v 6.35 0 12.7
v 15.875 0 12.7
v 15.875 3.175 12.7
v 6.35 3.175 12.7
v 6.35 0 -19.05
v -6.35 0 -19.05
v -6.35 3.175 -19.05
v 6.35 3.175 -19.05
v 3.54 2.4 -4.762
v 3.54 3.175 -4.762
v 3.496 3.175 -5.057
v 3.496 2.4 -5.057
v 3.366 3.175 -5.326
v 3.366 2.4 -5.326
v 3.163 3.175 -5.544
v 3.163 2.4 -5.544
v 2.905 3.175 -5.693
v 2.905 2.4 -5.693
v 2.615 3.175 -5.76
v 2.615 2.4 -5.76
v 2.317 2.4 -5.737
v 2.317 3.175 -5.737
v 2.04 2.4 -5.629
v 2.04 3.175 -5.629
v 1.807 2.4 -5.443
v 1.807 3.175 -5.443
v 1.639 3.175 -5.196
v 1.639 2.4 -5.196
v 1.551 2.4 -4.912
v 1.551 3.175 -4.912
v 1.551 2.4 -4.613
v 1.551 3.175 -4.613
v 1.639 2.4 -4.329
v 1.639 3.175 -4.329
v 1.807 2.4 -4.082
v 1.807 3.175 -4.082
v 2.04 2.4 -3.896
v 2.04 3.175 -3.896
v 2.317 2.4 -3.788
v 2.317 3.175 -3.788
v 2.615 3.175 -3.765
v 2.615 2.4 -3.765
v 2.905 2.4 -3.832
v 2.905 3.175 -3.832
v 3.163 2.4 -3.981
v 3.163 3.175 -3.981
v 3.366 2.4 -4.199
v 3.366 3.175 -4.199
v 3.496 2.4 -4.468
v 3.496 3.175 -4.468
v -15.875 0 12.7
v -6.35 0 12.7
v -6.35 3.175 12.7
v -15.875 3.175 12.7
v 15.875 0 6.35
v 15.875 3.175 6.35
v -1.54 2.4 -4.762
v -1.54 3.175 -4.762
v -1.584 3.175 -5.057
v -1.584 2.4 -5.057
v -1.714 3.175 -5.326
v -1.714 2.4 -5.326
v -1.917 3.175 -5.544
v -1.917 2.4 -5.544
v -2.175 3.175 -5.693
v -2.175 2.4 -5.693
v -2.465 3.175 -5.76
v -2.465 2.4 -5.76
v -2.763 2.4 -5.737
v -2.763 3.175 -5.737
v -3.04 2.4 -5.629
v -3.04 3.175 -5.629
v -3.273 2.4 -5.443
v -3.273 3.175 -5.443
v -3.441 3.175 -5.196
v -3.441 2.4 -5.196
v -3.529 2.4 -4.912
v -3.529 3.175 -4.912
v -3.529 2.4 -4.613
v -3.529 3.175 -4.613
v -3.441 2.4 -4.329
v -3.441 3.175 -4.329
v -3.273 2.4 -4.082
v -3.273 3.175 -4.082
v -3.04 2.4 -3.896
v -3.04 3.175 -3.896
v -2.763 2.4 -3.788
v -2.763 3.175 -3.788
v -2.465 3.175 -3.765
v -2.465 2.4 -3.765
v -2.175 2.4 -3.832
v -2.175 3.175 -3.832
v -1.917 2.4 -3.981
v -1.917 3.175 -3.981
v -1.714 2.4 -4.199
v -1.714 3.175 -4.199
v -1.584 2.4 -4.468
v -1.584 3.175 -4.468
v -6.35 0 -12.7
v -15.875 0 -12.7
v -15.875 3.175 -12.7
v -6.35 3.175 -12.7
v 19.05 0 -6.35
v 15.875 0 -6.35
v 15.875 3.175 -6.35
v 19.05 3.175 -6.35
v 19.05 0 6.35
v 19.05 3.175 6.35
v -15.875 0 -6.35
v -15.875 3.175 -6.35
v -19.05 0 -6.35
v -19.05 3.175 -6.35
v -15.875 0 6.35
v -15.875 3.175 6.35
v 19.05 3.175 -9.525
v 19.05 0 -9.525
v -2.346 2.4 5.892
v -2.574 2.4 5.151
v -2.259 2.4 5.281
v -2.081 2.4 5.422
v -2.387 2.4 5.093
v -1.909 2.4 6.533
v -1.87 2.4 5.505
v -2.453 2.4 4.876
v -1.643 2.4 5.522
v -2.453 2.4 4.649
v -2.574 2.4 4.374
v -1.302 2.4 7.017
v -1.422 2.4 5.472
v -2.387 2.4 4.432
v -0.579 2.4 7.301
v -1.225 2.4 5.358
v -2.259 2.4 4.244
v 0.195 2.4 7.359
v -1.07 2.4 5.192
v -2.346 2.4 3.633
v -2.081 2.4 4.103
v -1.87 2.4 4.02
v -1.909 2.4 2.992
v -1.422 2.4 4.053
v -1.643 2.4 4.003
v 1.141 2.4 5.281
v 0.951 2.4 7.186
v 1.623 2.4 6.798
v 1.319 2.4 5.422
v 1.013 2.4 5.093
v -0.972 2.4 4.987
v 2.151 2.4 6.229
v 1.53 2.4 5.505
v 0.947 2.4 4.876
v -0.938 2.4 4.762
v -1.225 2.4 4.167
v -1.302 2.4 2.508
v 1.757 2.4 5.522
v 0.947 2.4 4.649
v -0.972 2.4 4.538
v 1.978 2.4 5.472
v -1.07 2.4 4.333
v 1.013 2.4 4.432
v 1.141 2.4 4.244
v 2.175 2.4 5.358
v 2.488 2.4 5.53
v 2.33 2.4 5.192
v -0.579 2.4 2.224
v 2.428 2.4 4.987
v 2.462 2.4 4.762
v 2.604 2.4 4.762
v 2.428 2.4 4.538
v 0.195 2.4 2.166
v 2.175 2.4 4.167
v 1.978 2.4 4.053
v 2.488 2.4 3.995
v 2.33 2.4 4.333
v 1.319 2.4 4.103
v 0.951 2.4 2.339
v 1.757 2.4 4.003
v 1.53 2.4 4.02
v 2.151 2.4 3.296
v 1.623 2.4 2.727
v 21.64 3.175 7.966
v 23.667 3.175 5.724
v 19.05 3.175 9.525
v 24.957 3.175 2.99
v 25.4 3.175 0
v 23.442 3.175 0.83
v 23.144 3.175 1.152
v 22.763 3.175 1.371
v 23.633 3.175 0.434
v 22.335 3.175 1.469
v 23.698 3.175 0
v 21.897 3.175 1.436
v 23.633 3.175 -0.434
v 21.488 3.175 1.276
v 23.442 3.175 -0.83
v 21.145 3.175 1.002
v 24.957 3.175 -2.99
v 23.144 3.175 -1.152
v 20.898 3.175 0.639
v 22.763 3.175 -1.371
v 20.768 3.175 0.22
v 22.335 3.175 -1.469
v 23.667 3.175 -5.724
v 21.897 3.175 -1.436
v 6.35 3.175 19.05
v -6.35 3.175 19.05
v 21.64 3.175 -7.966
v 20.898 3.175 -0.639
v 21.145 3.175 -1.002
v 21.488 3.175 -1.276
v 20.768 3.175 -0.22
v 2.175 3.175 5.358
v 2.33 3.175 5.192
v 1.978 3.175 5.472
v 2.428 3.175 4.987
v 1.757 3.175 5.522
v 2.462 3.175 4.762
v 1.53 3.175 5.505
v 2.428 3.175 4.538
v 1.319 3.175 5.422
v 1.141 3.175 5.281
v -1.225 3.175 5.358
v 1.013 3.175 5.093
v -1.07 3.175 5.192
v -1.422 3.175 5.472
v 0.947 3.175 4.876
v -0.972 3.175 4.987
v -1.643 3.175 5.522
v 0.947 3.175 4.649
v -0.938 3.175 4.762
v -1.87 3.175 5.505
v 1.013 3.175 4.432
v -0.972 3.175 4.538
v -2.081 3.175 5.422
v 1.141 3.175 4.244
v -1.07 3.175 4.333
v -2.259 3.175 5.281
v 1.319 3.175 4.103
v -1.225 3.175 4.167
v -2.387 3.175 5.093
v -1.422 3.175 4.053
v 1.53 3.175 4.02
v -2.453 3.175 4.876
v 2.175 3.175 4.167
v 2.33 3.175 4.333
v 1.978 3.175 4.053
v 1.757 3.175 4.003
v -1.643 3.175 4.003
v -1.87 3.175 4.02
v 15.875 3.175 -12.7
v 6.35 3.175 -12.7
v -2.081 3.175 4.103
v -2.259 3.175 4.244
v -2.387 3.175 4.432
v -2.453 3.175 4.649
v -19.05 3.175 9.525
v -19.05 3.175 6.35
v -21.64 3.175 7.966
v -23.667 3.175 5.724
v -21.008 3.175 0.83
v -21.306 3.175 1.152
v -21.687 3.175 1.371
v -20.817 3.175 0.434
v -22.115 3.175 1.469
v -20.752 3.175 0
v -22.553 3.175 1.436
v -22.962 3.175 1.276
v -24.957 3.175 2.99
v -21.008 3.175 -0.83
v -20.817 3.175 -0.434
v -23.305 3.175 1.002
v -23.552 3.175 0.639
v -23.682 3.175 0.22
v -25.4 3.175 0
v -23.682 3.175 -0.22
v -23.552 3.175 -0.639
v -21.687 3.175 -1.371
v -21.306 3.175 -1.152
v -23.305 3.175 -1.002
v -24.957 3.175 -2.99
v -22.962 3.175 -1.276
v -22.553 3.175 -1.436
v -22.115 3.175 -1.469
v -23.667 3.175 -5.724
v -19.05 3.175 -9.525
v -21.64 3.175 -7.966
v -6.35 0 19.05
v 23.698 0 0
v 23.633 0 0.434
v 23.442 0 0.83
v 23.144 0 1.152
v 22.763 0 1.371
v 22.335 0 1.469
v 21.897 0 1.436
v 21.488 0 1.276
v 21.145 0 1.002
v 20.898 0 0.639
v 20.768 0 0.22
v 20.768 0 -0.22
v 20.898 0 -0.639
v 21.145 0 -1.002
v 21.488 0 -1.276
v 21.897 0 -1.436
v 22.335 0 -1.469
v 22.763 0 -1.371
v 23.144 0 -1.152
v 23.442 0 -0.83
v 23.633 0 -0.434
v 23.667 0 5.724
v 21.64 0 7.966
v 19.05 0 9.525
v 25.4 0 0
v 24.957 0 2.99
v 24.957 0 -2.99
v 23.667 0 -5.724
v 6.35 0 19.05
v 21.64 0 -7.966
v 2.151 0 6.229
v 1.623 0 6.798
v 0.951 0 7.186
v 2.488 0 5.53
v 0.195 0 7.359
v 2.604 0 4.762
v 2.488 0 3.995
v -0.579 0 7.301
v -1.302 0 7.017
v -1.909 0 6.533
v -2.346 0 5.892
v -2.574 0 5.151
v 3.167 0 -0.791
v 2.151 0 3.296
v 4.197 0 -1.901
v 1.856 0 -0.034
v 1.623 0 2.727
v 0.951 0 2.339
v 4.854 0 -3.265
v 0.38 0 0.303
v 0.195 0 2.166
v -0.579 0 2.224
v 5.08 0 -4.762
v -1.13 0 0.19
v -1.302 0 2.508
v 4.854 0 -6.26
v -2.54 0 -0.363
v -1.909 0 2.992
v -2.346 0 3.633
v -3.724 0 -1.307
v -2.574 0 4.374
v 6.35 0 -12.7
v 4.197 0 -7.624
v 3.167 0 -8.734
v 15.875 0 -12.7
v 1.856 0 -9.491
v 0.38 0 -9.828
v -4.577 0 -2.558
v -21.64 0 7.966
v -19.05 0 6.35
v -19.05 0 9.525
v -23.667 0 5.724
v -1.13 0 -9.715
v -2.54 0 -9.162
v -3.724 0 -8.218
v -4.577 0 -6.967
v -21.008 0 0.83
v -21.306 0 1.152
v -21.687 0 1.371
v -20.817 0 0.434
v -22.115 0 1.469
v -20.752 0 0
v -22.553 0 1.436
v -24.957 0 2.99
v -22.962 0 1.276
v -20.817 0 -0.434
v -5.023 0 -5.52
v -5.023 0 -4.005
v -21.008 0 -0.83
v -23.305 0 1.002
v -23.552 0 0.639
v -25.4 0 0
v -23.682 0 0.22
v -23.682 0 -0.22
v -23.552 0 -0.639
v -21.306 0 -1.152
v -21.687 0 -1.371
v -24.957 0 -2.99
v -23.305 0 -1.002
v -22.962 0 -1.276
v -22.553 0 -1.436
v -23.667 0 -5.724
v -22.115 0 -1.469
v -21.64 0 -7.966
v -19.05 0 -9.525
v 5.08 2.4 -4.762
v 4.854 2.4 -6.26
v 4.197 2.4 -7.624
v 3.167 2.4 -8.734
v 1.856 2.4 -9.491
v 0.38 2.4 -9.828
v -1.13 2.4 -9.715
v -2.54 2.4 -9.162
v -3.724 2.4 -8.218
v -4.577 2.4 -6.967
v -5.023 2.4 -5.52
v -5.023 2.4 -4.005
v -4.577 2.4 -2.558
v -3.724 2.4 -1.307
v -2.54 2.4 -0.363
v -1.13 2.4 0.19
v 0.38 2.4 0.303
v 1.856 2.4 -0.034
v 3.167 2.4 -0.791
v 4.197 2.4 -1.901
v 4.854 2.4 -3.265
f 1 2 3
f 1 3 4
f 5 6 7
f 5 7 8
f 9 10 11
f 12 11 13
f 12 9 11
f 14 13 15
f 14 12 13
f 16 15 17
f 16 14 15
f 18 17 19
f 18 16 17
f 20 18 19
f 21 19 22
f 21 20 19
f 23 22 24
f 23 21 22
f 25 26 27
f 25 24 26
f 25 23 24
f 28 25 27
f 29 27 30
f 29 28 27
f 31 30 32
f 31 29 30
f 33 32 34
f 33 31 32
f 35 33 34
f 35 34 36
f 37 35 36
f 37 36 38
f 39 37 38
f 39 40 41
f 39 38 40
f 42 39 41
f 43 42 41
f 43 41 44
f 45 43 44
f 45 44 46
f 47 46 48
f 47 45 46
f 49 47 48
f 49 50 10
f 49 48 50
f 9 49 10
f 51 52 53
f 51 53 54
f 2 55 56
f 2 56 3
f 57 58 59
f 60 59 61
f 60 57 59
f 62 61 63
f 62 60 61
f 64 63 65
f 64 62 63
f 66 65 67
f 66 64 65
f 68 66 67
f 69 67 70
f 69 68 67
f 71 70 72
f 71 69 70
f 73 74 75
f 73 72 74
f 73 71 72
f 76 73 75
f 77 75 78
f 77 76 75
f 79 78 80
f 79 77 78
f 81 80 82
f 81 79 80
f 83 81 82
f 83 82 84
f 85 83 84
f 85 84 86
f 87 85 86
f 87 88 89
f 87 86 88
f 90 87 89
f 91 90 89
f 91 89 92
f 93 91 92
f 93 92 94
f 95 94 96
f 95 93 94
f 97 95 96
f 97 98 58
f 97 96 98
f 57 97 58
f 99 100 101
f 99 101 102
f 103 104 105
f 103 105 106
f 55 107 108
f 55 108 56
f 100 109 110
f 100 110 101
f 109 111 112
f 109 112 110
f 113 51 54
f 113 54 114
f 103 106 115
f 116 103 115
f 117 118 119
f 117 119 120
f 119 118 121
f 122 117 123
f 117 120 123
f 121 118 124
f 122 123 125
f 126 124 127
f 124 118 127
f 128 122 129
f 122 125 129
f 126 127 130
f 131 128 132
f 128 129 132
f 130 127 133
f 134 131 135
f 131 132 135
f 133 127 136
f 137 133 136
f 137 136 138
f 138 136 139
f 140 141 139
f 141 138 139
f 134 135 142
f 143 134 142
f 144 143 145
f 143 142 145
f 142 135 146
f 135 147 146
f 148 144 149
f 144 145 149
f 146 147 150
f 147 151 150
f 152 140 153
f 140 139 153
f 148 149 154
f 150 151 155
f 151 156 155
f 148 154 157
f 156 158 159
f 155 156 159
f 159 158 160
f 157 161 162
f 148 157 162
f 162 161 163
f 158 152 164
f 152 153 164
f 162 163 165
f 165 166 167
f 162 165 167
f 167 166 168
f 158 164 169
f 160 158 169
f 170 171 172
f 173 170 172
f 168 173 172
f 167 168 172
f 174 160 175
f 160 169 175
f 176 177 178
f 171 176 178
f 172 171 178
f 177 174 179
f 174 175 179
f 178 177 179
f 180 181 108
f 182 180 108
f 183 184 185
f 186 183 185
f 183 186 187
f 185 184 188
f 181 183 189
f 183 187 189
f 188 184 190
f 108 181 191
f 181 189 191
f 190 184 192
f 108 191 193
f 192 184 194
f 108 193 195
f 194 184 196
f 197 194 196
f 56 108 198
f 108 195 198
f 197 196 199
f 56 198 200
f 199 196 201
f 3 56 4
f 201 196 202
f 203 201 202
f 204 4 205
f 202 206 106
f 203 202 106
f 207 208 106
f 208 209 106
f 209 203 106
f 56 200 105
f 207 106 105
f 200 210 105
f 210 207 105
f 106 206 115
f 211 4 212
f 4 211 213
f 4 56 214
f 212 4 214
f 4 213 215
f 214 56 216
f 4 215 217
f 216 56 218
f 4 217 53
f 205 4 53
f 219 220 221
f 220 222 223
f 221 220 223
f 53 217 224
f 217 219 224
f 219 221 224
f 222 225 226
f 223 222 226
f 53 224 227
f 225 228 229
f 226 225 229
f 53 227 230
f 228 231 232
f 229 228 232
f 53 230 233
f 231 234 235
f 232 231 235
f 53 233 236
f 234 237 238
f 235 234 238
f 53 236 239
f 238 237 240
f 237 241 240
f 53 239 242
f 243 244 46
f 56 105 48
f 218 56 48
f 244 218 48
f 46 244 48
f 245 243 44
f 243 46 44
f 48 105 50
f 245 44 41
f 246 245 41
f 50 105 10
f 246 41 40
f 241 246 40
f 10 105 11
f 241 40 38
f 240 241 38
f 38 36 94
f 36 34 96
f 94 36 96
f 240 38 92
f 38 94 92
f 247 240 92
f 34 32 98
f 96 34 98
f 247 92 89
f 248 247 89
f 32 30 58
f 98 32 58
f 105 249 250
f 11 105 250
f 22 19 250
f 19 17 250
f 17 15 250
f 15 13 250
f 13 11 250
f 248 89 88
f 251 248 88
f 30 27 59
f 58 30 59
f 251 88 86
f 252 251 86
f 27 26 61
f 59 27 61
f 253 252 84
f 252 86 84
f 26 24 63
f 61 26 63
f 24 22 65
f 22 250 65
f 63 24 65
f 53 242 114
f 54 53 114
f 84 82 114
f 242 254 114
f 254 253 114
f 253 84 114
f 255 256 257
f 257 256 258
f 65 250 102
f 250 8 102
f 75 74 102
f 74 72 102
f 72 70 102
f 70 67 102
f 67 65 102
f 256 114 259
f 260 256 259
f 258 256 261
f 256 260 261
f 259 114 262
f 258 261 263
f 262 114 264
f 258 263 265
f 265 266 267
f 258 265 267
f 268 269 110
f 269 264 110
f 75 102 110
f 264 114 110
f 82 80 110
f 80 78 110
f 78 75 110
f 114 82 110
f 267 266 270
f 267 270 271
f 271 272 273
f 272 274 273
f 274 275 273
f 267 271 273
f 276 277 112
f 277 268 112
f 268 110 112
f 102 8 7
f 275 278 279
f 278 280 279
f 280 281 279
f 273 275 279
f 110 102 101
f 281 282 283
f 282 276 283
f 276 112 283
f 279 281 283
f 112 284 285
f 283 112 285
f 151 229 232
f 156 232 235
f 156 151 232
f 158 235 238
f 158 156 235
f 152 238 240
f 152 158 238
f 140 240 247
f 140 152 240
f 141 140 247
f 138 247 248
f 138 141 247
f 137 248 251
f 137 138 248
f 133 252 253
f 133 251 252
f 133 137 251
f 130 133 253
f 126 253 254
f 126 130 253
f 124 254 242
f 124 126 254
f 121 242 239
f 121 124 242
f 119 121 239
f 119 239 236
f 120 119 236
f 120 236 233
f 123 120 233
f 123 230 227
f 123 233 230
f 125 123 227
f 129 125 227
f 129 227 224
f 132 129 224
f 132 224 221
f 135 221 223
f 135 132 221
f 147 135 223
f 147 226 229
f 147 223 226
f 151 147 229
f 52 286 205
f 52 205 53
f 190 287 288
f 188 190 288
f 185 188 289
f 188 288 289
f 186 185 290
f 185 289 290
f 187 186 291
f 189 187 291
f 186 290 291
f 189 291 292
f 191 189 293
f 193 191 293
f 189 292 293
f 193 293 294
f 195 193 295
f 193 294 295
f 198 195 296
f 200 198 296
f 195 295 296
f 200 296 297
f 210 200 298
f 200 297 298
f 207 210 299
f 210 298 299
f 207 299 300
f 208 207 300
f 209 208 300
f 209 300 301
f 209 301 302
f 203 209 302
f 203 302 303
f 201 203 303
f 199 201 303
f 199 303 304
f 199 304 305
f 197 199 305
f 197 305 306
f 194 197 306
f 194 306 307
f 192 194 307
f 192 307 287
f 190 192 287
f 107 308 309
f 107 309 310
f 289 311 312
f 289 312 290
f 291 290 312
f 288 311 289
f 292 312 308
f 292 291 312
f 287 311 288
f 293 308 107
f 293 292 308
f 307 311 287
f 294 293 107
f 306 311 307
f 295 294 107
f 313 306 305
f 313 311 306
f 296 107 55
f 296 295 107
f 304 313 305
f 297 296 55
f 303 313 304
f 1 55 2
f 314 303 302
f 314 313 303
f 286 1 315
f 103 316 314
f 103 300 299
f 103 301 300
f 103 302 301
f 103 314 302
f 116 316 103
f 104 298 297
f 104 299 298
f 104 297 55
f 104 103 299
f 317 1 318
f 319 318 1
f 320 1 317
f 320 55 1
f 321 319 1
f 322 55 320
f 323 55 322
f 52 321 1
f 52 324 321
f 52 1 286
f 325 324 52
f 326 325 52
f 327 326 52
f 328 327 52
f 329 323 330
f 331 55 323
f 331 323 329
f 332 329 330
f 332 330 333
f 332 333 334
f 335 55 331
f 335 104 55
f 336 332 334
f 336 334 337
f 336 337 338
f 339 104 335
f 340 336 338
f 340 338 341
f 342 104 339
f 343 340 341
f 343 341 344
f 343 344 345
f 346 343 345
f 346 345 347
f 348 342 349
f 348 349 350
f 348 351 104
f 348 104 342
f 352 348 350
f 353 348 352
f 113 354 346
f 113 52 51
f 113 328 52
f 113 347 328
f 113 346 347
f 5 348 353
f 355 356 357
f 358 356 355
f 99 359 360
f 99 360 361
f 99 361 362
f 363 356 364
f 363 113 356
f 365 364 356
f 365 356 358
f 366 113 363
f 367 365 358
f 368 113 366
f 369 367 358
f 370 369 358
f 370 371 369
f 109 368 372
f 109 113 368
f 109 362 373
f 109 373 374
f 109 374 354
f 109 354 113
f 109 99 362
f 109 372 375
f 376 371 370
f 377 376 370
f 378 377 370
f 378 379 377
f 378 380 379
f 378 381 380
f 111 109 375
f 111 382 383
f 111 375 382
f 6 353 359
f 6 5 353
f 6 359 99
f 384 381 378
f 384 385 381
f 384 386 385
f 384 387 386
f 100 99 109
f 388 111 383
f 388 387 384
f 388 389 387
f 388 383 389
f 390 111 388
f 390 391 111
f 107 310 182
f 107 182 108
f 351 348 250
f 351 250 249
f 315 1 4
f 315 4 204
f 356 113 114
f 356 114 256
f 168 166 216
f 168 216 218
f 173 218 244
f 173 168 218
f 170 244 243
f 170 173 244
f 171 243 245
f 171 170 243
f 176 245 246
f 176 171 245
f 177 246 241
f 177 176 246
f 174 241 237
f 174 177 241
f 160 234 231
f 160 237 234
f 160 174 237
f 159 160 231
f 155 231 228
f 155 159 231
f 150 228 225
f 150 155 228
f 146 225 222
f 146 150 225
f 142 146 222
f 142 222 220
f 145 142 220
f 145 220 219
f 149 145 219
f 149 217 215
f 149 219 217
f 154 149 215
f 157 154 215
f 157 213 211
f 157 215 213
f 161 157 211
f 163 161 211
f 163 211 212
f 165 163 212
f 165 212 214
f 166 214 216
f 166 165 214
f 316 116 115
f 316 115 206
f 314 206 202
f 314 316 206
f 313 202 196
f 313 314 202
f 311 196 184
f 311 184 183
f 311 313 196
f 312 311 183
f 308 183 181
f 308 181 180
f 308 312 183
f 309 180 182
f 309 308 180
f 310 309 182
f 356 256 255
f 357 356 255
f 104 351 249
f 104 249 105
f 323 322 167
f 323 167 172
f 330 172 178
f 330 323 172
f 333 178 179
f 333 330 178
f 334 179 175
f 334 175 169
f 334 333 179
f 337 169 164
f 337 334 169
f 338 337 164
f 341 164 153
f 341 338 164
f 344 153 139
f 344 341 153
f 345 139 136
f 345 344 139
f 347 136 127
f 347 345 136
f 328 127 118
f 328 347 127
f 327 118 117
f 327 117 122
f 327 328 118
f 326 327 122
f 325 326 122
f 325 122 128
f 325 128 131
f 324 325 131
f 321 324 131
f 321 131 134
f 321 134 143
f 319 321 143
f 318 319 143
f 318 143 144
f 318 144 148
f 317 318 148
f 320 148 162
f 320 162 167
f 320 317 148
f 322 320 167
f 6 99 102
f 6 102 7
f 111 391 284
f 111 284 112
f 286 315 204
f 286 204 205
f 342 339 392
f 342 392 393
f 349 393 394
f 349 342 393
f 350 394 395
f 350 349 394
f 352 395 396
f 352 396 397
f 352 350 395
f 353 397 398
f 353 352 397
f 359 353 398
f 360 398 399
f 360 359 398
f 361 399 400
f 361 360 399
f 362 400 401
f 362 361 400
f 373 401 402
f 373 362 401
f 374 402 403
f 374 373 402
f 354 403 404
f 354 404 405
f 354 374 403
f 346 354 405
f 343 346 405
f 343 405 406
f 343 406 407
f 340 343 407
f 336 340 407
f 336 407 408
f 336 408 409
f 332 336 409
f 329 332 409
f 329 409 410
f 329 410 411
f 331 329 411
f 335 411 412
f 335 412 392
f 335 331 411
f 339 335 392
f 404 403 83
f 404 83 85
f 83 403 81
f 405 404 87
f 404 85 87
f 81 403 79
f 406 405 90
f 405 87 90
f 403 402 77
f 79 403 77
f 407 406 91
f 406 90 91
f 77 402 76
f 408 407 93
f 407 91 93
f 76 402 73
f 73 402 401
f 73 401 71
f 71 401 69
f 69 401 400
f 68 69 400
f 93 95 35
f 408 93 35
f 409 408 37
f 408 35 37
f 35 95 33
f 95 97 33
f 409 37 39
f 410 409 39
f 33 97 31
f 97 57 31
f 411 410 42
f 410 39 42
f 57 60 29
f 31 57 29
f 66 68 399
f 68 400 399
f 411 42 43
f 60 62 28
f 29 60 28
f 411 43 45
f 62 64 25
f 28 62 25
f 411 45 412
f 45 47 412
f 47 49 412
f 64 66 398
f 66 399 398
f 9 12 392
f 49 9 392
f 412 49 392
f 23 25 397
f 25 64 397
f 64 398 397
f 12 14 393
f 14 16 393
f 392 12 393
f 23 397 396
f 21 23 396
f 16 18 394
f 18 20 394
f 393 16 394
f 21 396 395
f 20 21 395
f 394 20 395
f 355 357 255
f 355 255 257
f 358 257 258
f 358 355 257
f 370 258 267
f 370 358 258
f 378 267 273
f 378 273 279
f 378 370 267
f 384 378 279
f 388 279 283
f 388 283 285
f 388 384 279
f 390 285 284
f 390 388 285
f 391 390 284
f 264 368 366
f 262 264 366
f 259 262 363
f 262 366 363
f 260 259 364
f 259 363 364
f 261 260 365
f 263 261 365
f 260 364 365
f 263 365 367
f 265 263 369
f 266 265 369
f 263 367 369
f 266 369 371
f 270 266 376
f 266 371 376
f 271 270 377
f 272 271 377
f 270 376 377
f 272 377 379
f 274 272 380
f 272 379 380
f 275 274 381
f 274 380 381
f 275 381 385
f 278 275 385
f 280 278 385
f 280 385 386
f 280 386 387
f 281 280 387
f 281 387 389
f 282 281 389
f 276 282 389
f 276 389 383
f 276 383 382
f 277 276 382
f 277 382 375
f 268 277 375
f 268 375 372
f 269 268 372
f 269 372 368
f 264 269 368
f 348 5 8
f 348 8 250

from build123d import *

# Parameters (mm, degrees)
BOSS_EXTRUDE1_DEPTH       = 3.175
F_4_CLEARANCE_HOLE1_D     = 2.9464
F_4_CLEARANCE_HOLE1_DEPTH = 6.35
F_4_CLEARANCE_HOLE1_TIP   = 0.885187864
CUT_EXTRUDE3_REACH        = 33.908
SKETCH4_R                 = 0.762
SKETCH4_R_2               = 1
SKETCH4_3_R               = 5.08
SKETCH4_3_R_2             = 1
SKETCH4_3_R_3             = 2.6035
SKETCH4_3_R_4             = 0.762
CUT_EXTRUDE4_DEPTH        = 2.4


with BuildPart() as part:
    # Sketch1 → Boss-Extrude1 (new body)
    with BuildSketch(Plane(origin=(0, 0, 0), x_dir=(1, 0, 0), z_dir=(0, 1, 0))):
        with BuildLine():
            Line((-15.875, 12.7), (-6.35, 12.7))
            Line((-6.35, 12.7), (-6.35, 19.05))
            Line((-6.35, 19.05), (6.35, 19.05))
            Line((6.35, 19.05), (6.35, 12.7))
            Line((6.35, 12.7), (15.875, 12.7))
            Line((15.875, 12.7), (15.875, 6.35))
            Line((15.875, 6.35), (19.05, 6.35))
            Line((19.05, 6.35), (19.05, 9.525))
            ThreePointArc((19.05, 9.525), (25.4, 0), (19.05, -9.525))
            Line((19.05, -9.525), (19.05, -6.35))
            Line((19.05, -6.35), (15.875, -6.35))
            Line((15.875, -6.35), (15.875, -12.7))
            Line((15.875, -12.7), (6.35, -12.7))
            Line((6.35, -12.7), (6.35, -19.05))
            Line((6.35, -19.05), (-6.35, -19.05))
            Line((-6.35, -19.05), (-6.35, -12.7))
            Line((-6.35, -12.7), (-15.875, -12.7))
            Line((-15.875, -12.7), (-15.875, -6.35))
            Line((-15.875, -6.35), (-19.05, -6.35))
            Line((-19.05, -6.35), (-19.05, -9.525))
            ThreePointArc((-19.05, -9.525), (-25.4, 0), (-19.05, 9.525))
            Line((-19.05, 9.525), (-19.05, 6.35))
            Line((-19.05, 6.35), (-15.875, 6.35))
            Line((-15.875, 6.35), (-15.875, 12.7))
        make_face()
    extrude(amount=BOSS_EXTRUDE1_DEPTH)

    # #4 Clearance Hole1
    with Locations(Plane(origin=(0, 3.175, 0), x_dir=(-1, 0, 0), z_dir=(0, 1, 0))):
        with Locations((-22.225, 0), (22.225, 0)):
            Hole(F_4_CLEARANCE_HOLE1_D / 2, depth=F_4_CLEARANCE_HOLE1_DEPTH)
            with Locations((0, 0, -(F_4_CLEARANCE_HOLE1_DEPTH + F_4_CLEARANCE_HOLE1_TIP / 2))):  # 118° drill point
                Cone(0, F_4_CLEARANCE_HOLE1_D / 2, F_4_CLEARANCE_HOLE1_TIP, mode=Mode.SUBTRACT)

    # Sketch4 → Cut-Extrude3 (cut, up to next)
    with BuildSketch(Plane(origin=(0, 0, 0), x_dir=(1, 0, 0), z_dir=(0, 1, 0)), mode=Mode.PRIVATE) as cut_extrude3_sk1:
        with Locations((-1.7, -4.7625)):
            Circle(SKETCH4_R)
    cut_extrude3_tool1 = extrude(cut_extrude3_sk1.sketch, amount=CUT_EXTRUDE3_REACH, mode=Mode.PRIVATE) & part.part
    # Sketch4 → Cut-Extrude3 (cut, up to next)
    with BuildSketch(Plane(origin=(0, 0, 0), x_dir=(1, 0, 0), z_dir=(0, 1, 0)), mode=Mode.PRIVATE) as cut_extrude3_sk2:
        with Locations((1.7, -4.7625)):
            Circle(SKETCH4_R)
    cut_extrude3_tool2 = extrude(cut_extrude3_sk2.sketch, amount=CUT_EXTRUDE3_REACH, mode=Mode.PRIVATE) & part.part
    # Sketch4 → Cut-Extrude3 (cut, up to next)
    with BuildSketch(Plane(origin=(0, 0, 0), x_dir=(1, 0, 0), z_dir=(0, 1, 0)), mode=Mode.PRIVATE) as cut_extrude3_sk3:
        with Locations((-2.54, 4.7625)):
            Circle(SKETCH4_R_2)
    cut_extrude3_tool3 = extrude(cut_extrude3_sk3.sketch, amount=CUT_EXTRUDE3_REACH, mode=Mode.PRIVATE) & part.part
    # Sketch4 → Cut-Extrude3 (cut, up to next)
    with BuildSketch(Plane(origin=(0, 0, 0), x_dir=(1, 0, 0), z_dir=(0, 1, 0)), mode=Mode.PRIVATE) as cut_extrude3_sk4:
        with Locations((2.54, 4.7625)):
            Circle(SKETCH4_R_2)
    cut_extrude3_tool4 = extrude(cut_extrude3_sk4.sketch, amount=CUT_EXTRUDE3_REACH, mode=Mode.PRIVATE) & part.part
    add(cut_extrude3_tool1.solids().sort_by_distance((-1.7, 0, 4.7625))[0], mode=Mode.SUBTRACT)
    add(cut_extrude3_tool2.solids().sort_by_distance((1.7, 0, 4.7625))[0], mode=Mode.SUBTRACT)
    add(cut_extrude3_tool3.solids().sort_by_distance((-2.54, 0, -4.7625))[0], mode=Mode.SUBTRACT)
    add(cut_extrude3_tool4.solids().sort_by_distance((2.54, 0, -4.7625))[0], mode=Mode.SUBTRACT)

    # Sketch4<3> → Cut-Extrude4 (cut)
    # profile 1 of 2: a face of its own
    with BuildSketch(Plane(origin=(0, 0, 0), x_dir=(1, 0, 0), z_dir=(0, 1, 0))):
        with Locations((0, 4.7625)):
            Circle(SKETCH4_3_R)
        with Locations((-2.54, 4.7625)):
            Circle(SKETCH4_3_R_2, mode=Mode.SUBTRACT)
        with Locations((2.54, 4.7625)):
            Circle(SKETCH4_3_R_2, mode=Mode.SUBTRACT)
    # profile 2 of 2: a face of its own
    with BuildSketch(Plane(origin=(0, 0, 0), x_dir=(1, 0, 0), z_dir=(0, 1, 0))):
        with Locations((0, -4.7625)):
            Circle(SKETCH4_3_R_3)
        with Locations((-1.7, -4.7625)):
            Circle(SKETCH4_3_R_4, mode=Mode.SUBTRACT)
    extrude(amount=CUT_EXTRUDE4_DEPTH, mode=Mode.SUBTRACT)


solid = part.part
